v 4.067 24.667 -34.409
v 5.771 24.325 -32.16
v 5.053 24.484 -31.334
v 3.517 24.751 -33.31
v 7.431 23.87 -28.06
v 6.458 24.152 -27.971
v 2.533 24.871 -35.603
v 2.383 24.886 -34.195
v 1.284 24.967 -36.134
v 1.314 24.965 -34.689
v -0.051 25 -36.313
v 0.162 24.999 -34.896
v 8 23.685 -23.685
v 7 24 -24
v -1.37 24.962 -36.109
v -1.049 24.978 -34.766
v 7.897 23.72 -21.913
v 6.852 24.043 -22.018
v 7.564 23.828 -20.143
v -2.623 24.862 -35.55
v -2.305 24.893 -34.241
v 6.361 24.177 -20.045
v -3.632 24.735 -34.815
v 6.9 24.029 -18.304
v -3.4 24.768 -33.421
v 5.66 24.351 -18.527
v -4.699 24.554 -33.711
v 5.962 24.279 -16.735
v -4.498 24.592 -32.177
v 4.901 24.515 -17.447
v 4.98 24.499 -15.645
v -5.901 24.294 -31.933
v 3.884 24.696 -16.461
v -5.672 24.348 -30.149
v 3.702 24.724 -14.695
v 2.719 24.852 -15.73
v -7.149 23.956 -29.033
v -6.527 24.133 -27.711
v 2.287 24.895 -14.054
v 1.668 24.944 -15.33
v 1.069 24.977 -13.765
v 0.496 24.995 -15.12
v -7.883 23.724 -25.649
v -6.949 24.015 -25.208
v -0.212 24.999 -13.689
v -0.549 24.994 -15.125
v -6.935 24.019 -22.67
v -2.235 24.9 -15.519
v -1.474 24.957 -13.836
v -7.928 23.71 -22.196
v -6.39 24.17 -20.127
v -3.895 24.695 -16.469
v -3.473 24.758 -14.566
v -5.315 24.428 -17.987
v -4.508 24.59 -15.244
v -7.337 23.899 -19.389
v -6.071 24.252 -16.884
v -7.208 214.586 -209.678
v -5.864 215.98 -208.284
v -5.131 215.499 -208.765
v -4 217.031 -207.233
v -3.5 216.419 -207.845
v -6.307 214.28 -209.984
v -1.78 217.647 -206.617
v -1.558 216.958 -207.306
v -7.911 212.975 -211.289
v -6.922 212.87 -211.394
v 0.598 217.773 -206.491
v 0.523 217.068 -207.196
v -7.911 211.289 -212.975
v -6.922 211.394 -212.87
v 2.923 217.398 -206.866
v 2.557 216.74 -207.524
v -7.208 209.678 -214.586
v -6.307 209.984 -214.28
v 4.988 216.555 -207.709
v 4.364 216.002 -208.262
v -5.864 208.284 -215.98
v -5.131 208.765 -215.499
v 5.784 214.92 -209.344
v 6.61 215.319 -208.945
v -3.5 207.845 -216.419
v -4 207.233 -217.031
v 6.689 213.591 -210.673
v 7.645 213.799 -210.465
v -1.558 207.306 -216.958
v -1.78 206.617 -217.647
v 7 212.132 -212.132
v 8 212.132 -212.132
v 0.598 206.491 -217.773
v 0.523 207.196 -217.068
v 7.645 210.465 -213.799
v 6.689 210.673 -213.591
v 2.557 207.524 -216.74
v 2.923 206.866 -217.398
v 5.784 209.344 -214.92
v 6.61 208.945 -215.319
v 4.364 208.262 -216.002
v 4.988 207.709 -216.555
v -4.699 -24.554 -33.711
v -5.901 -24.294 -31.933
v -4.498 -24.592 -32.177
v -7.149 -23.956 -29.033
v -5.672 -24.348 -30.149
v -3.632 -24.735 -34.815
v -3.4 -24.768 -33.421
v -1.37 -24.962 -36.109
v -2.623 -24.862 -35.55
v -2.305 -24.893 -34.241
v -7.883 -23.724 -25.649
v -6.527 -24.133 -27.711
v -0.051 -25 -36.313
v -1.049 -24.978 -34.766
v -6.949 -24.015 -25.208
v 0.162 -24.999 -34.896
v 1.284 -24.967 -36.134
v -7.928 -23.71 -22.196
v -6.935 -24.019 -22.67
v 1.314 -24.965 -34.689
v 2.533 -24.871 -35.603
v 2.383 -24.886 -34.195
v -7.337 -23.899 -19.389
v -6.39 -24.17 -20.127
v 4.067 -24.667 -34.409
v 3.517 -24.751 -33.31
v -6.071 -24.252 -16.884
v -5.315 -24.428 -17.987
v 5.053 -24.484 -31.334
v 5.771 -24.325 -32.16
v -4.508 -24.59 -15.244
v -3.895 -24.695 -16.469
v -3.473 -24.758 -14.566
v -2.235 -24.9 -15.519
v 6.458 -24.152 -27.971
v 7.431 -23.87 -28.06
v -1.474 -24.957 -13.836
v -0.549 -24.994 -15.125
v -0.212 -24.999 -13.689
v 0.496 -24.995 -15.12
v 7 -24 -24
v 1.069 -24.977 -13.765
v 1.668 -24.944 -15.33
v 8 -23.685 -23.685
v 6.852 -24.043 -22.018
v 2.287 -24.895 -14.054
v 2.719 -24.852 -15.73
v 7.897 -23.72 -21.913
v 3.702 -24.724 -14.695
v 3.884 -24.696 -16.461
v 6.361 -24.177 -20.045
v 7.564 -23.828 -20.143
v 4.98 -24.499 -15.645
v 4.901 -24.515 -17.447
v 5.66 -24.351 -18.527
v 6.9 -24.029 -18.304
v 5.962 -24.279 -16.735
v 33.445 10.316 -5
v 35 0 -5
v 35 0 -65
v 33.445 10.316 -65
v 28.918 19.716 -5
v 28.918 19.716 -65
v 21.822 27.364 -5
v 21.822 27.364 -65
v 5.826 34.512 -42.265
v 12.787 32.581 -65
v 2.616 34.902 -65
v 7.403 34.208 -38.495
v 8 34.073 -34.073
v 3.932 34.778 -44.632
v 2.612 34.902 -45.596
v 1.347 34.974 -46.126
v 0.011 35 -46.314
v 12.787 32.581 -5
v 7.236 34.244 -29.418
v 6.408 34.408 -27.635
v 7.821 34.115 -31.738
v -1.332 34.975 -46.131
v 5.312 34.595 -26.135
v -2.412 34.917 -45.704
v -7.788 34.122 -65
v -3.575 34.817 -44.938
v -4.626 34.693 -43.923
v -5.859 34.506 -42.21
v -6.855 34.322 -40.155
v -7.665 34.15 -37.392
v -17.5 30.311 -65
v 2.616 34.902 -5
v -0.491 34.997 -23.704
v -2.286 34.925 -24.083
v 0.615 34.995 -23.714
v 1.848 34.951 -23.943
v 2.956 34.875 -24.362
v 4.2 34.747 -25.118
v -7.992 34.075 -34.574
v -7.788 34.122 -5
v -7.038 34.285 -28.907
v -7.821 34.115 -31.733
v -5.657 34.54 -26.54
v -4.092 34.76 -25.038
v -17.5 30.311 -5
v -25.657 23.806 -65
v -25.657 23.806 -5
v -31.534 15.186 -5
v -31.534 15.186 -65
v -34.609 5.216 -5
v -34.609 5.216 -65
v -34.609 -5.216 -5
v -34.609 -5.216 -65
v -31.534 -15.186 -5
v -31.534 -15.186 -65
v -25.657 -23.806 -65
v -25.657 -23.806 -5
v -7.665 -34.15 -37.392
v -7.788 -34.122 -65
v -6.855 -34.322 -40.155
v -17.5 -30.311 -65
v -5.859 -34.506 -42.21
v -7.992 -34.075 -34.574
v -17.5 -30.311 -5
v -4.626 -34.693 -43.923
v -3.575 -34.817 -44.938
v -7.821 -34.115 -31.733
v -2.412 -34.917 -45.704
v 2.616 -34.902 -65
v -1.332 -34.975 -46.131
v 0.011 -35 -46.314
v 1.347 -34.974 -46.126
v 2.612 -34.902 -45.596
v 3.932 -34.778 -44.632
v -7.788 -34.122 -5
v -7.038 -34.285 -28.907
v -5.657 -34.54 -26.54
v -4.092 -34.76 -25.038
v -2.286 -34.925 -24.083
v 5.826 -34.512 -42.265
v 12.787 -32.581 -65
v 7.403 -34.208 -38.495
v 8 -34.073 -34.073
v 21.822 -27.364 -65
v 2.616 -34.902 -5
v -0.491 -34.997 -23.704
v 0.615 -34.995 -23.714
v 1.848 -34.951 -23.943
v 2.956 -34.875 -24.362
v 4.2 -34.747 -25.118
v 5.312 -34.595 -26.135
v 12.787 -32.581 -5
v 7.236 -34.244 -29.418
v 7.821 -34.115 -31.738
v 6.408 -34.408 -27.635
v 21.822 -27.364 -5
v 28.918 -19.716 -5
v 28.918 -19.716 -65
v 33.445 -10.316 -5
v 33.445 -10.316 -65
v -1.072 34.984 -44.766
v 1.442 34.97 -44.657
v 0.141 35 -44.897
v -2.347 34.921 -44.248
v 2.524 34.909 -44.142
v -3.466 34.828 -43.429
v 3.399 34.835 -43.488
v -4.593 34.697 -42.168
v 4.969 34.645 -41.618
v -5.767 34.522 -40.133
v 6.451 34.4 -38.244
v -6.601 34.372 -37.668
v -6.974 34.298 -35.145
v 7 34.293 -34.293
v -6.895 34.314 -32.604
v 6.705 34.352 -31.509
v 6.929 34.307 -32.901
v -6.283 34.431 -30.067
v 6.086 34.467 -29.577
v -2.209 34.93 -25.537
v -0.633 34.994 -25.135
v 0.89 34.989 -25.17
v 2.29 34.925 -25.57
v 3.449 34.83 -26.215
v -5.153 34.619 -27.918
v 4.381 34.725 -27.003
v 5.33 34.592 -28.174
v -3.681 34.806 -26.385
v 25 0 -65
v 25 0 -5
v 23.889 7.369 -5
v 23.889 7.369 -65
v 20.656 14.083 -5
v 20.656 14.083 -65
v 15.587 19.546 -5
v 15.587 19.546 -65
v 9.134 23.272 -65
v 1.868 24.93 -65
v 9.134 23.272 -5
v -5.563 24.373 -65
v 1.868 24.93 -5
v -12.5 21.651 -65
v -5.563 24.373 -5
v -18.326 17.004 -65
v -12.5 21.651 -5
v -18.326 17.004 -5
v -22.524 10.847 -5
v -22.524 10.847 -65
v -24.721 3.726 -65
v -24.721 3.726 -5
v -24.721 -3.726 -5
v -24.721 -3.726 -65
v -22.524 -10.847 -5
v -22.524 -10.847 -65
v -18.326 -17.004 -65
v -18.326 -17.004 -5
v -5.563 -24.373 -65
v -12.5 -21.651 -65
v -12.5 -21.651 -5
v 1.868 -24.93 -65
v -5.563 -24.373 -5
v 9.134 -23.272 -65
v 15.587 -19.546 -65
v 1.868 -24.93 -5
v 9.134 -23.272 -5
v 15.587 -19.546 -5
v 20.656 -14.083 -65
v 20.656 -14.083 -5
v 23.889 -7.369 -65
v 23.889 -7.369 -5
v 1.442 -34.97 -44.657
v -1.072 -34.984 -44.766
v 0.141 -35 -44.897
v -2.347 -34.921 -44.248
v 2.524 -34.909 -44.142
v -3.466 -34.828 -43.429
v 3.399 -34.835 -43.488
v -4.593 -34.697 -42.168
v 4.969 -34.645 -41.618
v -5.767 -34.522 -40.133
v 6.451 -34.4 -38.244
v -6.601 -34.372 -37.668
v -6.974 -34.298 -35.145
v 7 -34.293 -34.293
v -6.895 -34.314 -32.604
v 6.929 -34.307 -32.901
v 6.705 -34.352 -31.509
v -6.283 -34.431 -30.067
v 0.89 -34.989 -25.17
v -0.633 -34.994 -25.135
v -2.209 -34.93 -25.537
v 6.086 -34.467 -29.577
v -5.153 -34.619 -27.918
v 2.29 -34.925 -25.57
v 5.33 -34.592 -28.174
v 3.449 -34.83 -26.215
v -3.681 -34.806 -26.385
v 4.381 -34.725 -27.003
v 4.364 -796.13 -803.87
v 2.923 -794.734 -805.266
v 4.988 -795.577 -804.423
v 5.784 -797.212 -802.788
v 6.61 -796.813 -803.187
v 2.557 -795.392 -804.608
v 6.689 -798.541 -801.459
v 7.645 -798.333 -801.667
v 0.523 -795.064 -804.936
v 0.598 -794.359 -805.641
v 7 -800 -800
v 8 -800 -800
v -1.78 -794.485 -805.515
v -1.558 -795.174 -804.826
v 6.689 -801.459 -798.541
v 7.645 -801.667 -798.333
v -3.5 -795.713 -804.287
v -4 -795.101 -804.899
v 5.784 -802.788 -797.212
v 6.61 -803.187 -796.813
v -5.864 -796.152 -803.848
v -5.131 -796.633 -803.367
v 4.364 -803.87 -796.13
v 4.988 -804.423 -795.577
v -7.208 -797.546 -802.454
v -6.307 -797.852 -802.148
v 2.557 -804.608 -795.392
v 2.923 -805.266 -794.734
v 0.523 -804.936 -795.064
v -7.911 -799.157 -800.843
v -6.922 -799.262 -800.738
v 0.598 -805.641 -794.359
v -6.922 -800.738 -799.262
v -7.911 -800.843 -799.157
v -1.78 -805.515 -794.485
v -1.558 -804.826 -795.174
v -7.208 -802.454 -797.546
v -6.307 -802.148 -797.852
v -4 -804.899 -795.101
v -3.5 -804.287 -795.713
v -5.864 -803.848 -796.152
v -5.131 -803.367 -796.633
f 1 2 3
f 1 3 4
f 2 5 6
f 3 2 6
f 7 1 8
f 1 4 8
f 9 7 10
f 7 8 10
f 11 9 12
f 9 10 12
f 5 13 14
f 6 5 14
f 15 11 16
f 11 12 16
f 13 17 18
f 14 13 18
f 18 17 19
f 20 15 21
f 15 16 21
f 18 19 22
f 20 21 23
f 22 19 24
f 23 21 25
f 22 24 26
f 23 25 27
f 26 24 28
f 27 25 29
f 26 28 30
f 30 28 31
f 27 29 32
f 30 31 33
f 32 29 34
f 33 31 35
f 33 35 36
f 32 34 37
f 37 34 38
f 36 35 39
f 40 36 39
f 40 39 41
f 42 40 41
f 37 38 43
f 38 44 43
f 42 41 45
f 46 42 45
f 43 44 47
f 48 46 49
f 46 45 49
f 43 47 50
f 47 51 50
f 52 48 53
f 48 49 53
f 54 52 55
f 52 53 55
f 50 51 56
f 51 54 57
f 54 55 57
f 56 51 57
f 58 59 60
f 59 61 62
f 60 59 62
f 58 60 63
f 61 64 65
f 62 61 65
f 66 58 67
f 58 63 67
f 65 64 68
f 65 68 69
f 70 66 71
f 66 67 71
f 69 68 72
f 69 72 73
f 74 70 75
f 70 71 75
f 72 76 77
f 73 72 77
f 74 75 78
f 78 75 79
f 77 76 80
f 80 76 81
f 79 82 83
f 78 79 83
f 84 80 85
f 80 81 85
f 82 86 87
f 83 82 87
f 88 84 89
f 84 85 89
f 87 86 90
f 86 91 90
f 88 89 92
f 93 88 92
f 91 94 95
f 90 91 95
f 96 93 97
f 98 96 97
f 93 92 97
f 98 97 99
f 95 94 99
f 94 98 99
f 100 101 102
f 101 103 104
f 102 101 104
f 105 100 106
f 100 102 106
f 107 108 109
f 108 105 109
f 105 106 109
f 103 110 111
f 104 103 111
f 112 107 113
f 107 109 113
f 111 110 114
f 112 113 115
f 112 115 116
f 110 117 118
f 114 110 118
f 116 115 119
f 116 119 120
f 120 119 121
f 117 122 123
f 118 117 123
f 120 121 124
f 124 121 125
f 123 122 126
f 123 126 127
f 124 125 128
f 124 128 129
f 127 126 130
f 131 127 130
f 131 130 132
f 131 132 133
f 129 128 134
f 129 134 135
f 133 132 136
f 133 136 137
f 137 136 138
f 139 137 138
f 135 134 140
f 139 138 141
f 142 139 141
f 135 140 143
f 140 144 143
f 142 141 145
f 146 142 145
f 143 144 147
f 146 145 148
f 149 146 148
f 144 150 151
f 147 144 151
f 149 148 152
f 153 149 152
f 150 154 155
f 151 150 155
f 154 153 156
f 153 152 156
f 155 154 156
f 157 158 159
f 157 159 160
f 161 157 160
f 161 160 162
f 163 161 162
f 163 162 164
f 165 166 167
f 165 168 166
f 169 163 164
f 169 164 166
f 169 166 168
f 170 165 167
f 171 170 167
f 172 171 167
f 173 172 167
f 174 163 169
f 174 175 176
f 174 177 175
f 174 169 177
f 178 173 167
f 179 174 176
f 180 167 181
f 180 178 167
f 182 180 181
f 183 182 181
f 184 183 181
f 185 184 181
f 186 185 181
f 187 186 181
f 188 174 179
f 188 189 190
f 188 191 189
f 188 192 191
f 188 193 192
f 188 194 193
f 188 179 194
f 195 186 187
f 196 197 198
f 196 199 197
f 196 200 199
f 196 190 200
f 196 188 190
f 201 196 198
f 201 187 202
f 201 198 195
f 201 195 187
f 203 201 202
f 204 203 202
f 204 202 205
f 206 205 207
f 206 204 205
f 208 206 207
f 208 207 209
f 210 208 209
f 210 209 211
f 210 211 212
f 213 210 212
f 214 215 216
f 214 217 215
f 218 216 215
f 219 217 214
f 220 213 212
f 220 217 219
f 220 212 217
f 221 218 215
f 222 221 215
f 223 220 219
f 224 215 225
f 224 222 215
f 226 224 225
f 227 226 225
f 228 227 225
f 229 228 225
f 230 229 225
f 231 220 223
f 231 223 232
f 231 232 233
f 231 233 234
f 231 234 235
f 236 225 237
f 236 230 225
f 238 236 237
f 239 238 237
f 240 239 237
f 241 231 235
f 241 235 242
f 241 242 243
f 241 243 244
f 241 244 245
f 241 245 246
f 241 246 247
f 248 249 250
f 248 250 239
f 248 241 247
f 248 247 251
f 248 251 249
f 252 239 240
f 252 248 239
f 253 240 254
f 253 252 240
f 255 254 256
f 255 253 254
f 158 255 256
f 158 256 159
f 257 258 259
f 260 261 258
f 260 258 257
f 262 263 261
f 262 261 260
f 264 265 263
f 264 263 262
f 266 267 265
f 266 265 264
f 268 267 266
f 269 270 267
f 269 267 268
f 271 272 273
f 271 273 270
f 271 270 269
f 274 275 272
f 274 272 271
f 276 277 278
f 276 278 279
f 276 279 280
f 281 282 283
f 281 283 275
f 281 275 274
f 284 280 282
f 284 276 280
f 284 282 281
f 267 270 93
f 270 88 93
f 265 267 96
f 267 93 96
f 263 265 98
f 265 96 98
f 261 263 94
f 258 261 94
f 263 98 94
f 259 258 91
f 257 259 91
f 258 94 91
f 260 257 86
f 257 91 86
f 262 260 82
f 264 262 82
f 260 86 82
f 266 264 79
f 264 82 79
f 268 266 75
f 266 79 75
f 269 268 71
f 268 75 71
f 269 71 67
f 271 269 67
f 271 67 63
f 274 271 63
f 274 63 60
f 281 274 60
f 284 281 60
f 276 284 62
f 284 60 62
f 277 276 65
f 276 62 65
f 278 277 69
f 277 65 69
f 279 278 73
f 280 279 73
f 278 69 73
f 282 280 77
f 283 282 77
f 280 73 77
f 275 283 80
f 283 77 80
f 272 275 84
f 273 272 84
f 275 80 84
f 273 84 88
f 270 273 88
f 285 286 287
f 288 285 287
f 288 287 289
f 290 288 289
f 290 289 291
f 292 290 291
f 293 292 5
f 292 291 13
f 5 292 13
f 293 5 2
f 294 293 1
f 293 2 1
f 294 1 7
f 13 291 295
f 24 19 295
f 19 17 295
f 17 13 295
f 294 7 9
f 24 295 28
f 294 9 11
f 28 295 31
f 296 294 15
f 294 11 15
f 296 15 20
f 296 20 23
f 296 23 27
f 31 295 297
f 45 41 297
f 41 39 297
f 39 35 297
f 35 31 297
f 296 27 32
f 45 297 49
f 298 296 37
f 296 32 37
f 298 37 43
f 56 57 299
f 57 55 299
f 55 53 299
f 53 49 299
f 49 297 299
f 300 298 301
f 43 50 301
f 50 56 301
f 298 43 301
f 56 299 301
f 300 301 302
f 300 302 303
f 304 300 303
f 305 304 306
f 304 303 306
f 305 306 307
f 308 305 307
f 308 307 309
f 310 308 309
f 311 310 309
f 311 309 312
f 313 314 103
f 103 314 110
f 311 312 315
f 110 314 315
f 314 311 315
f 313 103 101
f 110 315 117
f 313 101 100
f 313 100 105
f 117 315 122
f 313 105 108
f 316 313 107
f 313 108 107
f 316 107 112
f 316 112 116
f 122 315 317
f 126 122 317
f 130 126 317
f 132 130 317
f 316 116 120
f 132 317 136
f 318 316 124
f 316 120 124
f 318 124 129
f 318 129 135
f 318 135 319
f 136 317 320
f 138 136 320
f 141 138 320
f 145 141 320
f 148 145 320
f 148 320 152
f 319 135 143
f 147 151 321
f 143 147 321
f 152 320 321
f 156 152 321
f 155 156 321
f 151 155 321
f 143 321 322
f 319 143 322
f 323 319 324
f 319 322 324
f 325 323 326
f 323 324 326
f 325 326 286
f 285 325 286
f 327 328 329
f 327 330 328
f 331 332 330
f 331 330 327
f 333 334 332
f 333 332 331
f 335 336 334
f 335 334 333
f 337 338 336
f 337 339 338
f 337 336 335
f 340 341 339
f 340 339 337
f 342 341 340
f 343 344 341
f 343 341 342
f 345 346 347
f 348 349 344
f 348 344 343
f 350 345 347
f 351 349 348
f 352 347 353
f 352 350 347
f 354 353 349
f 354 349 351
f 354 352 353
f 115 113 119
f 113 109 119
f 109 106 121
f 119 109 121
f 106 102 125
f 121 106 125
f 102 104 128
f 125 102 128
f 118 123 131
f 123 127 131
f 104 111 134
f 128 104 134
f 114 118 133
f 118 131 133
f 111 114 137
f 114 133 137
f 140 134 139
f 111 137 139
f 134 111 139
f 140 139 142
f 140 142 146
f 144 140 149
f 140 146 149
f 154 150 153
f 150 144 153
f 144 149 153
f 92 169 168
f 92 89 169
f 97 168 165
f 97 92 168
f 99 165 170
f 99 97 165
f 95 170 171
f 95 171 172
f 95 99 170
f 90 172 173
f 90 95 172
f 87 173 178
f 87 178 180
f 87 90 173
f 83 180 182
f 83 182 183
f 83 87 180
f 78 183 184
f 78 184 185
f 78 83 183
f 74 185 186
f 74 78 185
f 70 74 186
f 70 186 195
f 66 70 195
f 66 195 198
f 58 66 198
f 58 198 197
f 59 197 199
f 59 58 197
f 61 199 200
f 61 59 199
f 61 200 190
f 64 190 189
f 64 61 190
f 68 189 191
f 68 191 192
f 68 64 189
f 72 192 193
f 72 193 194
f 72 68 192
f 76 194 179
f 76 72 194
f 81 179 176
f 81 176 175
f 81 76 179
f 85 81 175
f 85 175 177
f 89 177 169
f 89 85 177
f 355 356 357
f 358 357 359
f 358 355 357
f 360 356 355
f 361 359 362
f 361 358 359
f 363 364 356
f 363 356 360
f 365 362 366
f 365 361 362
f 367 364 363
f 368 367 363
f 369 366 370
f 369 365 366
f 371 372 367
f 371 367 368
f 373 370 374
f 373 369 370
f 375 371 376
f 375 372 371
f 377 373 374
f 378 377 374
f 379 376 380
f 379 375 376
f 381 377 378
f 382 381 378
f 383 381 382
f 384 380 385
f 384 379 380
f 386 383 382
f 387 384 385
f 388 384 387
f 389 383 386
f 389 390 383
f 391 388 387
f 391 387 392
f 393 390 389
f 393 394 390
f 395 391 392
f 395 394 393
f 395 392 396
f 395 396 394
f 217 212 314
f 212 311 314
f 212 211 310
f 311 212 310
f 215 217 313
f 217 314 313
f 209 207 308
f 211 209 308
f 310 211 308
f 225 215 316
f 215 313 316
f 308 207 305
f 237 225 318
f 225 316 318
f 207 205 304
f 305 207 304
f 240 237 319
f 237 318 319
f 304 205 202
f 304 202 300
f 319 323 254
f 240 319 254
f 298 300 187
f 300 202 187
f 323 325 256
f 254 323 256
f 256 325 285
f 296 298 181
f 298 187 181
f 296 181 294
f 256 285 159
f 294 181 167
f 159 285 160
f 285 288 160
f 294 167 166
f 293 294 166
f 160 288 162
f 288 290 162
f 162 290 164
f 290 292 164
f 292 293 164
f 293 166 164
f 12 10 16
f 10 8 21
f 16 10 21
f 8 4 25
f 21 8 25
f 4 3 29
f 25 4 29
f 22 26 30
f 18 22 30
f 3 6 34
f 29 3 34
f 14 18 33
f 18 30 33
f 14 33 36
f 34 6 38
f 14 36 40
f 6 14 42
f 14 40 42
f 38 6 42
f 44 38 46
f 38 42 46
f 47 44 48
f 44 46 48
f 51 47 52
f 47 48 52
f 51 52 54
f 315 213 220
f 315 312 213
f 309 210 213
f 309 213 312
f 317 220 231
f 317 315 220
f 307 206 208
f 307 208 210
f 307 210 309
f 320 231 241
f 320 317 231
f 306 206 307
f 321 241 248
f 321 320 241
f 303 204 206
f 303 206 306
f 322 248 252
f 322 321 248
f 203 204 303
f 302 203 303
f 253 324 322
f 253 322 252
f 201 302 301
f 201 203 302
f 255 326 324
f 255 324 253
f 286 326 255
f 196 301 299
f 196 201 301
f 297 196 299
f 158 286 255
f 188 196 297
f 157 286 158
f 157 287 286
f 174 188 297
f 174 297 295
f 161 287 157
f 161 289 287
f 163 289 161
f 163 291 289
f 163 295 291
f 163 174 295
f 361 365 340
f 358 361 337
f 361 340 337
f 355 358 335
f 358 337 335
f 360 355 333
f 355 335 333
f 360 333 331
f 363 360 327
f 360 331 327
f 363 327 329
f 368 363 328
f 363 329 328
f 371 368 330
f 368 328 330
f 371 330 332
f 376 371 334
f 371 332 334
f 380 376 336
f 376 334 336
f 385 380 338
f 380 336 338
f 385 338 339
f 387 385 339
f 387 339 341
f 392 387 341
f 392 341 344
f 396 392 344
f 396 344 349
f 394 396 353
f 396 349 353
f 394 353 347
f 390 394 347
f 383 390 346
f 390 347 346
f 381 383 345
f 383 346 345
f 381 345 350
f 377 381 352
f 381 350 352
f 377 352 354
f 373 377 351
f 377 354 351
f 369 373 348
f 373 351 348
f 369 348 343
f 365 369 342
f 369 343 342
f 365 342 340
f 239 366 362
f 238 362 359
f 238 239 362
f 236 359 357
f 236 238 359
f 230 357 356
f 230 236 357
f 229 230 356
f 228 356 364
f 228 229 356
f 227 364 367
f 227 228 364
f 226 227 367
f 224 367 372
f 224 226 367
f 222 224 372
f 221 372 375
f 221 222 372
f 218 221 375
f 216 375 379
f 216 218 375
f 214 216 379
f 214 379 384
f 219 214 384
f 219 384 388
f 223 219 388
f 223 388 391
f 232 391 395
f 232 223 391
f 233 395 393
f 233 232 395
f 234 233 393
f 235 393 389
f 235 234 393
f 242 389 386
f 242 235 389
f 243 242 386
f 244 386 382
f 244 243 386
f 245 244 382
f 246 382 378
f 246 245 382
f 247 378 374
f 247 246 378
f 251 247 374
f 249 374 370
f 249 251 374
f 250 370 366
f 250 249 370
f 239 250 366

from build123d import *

# Parameters (mm, degrees)
F2_R     = 8
F2_R_2   = 7
F4_R     = 25
F5_DEPTH = 40
F7_START = -5
F6_R     = 35
F6_R_2   = 25
F7_DEPTH = 60


with BuildPart() as f3:
    # F3: sweep along a path in F0
    with BuildLine(Plane.YZ) as f3_path:
        Line((-800, -800), (0, 0))
        Line((0, 0), (212.132034356, -212.132034356))
    # F2 (on line) → F3 (sweep)
    with BuildSketch(Plane(origin=(0, -800, -800), x_dir=(1, 0, 0), z_dir=(0, -0.7071067812, -0.7071067812))):
        Circle(F2_R)
        Circle(F2_R_2, mode=Mode.SUBTRACT)
    sweep(path=f3_path.line, transition=Transition.RIGHT)

    # F4 (on Top) → F5 (cut, symmetric)
    with BuildSketch(Plane.XY):
        Circle(F4_R)
    extrude(amount=F5_DEPTH, both=True, mode=Mode.SUBTRACT)

    # F6 (on Top) → F7 (join)
    with BuildSketch(Plane.XY.offset(F7_START)):
        Circle(F6_R)
        Circle(F6_R_2, mode=Mode.SUBTRACT)
    extrude(amount=-F7_DEPTH)


solid = f3.part
